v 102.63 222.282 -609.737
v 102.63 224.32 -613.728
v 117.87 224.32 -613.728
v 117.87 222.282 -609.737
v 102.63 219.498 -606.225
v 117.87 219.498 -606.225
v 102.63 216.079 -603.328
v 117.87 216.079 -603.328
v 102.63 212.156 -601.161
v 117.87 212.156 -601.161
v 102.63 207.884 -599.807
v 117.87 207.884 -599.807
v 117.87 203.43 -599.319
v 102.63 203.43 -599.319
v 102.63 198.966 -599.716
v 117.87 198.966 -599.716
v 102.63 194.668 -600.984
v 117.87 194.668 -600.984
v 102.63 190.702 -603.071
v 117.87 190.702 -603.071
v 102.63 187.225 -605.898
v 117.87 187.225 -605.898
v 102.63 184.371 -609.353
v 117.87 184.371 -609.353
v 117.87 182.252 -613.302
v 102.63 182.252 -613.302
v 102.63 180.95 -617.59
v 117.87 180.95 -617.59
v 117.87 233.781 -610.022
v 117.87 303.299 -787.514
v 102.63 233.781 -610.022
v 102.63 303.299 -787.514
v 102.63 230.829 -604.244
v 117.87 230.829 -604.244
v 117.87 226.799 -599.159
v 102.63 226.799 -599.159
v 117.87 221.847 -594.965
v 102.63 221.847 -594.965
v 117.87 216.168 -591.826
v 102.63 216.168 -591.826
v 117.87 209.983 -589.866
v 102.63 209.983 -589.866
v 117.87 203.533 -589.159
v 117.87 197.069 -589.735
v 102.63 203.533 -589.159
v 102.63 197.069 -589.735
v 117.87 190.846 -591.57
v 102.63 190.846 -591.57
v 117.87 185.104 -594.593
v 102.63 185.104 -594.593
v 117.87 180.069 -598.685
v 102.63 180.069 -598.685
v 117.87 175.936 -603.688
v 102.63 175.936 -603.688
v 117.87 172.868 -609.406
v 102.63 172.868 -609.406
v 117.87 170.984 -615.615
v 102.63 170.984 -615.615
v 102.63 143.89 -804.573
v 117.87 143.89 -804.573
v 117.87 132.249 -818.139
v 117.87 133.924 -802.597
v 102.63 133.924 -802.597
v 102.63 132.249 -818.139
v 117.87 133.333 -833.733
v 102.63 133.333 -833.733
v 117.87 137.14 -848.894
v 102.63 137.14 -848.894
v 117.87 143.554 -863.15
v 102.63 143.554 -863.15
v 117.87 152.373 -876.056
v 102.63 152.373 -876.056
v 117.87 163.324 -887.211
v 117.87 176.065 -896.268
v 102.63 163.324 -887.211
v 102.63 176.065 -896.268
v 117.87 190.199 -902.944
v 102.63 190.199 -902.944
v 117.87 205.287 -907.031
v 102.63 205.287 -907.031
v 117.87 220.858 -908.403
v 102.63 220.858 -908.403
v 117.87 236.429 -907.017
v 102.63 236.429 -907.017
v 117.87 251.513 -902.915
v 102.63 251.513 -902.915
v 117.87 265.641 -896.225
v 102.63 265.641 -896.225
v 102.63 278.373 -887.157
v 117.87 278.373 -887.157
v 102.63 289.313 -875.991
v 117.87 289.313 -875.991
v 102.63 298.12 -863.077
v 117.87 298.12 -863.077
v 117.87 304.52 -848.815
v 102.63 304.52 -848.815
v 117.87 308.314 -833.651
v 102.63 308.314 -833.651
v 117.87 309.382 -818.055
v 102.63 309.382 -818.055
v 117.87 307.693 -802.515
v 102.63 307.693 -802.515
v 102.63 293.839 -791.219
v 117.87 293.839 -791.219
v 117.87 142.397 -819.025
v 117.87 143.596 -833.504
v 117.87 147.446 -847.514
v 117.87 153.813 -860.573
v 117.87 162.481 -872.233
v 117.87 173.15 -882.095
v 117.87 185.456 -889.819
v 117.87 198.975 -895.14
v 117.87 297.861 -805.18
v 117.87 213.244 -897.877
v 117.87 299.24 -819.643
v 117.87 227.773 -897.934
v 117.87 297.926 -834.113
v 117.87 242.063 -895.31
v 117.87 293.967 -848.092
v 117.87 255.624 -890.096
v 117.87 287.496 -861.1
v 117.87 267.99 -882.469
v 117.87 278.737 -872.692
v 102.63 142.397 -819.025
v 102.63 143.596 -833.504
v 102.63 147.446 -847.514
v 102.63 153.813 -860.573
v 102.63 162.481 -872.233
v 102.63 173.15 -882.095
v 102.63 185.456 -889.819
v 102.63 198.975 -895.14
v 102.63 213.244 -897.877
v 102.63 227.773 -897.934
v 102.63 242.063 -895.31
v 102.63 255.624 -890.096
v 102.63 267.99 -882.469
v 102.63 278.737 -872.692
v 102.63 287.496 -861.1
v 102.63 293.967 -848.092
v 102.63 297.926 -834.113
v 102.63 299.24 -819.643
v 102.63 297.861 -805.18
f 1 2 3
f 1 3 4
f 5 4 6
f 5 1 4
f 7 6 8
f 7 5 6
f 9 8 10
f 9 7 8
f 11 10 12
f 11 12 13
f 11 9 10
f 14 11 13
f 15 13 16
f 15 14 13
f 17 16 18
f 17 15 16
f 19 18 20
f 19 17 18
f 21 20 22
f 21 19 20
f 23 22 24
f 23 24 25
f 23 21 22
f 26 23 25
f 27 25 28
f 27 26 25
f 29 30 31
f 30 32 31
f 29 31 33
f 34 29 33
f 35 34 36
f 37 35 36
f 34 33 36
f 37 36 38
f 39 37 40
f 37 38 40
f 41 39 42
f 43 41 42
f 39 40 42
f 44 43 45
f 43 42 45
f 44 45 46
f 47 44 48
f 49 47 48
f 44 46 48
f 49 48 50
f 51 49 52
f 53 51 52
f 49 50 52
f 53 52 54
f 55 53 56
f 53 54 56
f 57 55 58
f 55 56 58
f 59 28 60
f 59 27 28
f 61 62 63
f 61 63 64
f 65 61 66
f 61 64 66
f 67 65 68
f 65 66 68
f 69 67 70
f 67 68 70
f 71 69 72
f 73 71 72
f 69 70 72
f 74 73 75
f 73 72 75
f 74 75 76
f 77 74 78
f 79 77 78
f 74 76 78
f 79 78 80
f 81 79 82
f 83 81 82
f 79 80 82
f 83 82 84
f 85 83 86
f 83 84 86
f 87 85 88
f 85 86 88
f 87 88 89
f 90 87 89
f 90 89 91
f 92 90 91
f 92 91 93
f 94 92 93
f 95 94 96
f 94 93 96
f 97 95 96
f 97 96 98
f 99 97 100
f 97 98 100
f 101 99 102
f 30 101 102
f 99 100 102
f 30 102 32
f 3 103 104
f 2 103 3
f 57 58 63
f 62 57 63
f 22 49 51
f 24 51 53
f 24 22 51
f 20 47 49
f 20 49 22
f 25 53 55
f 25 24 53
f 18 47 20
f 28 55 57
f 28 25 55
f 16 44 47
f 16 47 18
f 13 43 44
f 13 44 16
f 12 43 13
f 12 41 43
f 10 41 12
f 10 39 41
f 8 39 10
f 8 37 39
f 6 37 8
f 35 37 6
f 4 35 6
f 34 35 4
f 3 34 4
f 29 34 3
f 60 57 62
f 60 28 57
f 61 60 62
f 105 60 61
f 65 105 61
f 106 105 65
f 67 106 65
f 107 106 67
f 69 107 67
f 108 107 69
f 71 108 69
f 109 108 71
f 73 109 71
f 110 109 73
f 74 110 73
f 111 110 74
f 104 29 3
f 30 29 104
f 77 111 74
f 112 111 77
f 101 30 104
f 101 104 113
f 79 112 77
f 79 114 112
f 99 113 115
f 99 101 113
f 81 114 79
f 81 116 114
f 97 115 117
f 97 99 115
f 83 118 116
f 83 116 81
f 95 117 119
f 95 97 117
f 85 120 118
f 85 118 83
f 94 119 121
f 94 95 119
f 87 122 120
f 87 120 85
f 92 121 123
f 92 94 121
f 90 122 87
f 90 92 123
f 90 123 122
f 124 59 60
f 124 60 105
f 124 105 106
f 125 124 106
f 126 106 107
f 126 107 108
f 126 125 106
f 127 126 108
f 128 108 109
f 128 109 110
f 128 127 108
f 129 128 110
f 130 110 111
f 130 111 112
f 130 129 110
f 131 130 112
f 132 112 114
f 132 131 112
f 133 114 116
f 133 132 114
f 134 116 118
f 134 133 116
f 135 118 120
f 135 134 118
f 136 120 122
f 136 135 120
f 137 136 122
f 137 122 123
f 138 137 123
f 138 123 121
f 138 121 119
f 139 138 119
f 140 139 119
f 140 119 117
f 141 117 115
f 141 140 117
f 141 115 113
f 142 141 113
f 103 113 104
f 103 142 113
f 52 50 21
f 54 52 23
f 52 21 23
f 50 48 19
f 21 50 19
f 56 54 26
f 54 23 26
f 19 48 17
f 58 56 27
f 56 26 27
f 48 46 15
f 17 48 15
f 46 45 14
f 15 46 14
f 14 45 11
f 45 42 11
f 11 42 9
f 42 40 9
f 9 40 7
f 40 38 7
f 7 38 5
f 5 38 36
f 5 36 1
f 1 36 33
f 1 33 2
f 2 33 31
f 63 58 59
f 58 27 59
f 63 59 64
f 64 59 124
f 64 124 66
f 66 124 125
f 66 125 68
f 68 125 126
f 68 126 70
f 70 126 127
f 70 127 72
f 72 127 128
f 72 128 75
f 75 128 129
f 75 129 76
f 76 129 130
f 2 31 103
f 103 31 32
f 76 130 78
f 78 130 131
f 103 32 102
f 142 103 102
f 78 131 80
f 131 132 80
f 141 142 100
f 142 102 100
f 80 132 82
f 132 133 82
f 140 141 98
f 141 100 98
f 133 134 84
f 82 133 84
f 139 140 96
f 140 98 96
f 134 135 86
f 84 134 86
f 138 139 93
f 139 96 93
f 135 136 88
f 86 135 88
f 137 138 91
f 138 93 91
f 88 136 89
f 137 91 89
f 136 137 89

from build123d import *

# Parameters (mm, degrees)
EXTRUDE_THIN1_DEPTH = 7.62


with BuildPart() as part:
    # Sketch1 → Extrude-Thin1 (new, symmetric)
    with BuildSketch(Plane.ZY.offset(-110.25)):
        with BuildLine():
            Line((-615.614704462, 170.984199418), (-802.597206958, 133.923548514))
            ThreePointArc((-802.597206958, 133.923548514), (-908.053927045, 228.674152785), (-787.513709868, 303.298899781))
            Line((-787.513709868, 303.298899781), (-610.022461239, 233.780522747))
            ThreePointArc((-610.022461239, 233.780522747), (-589.286960141, 200.286783656), (-615.614704462, 170.984199418))
        make_face()
        with BuildLine():
            Line((-617.590029198, 180.950326659), (-804.572531695, 143.889675755))
            ThreePointArc((-804.572531695, 143.889675755), (-897.933976221, 227.772933997), (-791.21902444, 293.838654333))
            Line((-791.21902444, 293.838654333), (-613.72777581, 224.320277299))
            ThreePointArc((-613.72777581, 224.320277299), (-599.406910966, 201.188002445), (-617.590029198, 180.950326659))
        make_face(mode=Mode.SUBTRACT)
    extrude(amount=EXTRUDE_THIN1_DEPTH, both=True)


solid = part.part
